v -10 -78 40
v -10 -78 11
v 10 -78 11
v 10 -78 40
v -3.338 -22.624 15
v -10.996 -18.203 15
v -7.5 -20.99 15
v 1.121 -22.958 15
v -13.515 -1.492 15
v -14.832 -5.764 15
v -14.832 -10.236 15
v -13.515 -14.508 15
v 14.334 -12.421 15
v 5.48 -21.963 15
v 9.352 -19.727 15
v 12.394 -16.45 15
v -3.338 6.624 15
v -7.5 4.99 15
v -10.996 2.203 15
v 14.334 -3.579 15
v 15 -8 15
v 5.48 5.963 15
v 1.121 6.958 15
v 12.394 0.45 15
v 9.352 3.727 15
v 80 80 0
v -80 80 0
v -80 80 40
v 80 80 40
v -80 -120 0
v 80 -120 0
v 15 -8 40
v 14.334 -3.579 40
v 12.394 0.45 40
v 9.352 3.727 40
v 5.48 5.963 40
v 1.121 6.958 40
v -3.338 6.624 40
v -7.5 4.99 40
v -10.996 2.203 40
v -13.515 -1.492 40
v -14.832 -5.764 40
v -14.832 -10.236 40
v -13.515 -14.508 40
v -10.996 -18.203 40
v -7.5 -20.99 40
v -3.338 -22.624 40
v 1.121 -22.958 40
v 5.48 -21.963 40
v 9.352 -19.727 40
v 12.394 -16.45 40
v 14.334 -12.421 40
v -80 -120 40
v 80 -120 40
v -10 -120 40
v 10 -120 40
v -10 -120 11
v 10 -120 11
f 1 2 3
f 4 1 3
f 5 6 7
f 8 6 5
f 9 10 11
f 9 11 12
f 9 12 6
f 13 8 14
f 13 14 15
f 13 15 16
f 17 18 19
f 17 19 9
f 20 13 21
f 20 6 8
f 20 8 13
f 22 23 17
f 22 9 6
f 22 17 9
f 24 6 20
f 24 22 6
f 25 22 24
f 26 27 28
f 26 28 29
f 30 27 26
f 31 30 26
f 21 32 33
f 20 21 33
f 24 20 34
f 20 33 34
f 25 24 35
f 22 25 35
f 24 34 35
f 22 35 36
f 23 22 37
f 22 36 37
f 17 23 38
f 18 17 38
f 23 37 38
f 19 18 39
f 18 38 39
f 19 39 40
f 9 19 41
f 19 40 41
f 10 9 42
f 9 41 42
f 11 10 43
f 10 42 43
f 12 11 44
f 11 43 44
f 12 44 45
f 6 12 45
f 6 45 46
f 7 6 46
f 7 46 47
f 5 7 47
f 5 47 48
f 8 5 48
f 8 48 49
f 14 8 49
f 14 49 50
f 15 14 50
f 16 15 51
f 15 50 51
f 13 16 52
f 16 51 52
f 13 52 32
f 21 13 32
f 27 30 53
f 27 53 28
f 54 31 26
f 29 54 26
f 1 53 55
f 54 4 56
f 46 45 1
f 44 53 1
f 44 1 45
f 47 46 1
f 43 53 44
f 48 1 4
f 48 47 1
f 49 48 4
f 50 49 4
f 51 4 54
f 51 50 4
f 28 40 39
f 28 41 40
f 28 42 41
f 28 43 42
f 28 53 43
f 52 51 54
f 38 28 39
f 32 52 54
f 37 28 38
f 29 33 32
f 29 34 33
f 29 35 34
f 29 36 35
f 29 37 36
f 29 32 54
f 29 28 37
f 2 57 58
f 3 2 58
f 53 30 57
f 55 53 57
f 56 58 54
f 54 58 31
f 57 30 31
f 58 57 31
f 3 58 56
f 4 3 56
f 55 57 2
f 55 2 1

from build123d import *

# Parameters (mm, degrees)
SKETCH1_W           = 160
SKETCH1_H           = 200
BOSS_EXTRUDE1_DEPTH = 40
SKETCH2_W           = 20
SKETCH2_H           = 29
CUT_EXTRUDE1_DEPTH  = 42
SKETCH3_R           = 15
CUT_EXTRUDE2_DEPTH  = 25


with BuildPart() as part:
    # Sketch1 → Boss-Extrude1 (new body)
    with BuildSketch(Plane.XY):
        with Locations((0, -20)):
            Rectangle(SKETCH1_W, SKETCH1_H)
    extrude(amount=BOSS_EXTRUDE1_DEPTH)

    # Sketch2 → Cut-Extrude1 (cut)
    with BuildSketch(Plane.XZ.offset(120)):
        with Locations((0, 25.5)):
            Rectangle(SKETCH2_W, SKETCH2_H)
    extrude(amount=-CUT_EXTRUDE1_DEPTH, mode=Mode.SUBTRACT)

    # Sketch3 → Cut-Extrude2 (cut)
    with BuildSketch(Plane.XY.offset(40)):
        with Locations((0, -8)):
            Circle(SKETCH3_R)
    extrude(amount=-CUT_EXTRUDE2_DEPTH, mode=Mode.SUBTRACT)


solid = part.part
